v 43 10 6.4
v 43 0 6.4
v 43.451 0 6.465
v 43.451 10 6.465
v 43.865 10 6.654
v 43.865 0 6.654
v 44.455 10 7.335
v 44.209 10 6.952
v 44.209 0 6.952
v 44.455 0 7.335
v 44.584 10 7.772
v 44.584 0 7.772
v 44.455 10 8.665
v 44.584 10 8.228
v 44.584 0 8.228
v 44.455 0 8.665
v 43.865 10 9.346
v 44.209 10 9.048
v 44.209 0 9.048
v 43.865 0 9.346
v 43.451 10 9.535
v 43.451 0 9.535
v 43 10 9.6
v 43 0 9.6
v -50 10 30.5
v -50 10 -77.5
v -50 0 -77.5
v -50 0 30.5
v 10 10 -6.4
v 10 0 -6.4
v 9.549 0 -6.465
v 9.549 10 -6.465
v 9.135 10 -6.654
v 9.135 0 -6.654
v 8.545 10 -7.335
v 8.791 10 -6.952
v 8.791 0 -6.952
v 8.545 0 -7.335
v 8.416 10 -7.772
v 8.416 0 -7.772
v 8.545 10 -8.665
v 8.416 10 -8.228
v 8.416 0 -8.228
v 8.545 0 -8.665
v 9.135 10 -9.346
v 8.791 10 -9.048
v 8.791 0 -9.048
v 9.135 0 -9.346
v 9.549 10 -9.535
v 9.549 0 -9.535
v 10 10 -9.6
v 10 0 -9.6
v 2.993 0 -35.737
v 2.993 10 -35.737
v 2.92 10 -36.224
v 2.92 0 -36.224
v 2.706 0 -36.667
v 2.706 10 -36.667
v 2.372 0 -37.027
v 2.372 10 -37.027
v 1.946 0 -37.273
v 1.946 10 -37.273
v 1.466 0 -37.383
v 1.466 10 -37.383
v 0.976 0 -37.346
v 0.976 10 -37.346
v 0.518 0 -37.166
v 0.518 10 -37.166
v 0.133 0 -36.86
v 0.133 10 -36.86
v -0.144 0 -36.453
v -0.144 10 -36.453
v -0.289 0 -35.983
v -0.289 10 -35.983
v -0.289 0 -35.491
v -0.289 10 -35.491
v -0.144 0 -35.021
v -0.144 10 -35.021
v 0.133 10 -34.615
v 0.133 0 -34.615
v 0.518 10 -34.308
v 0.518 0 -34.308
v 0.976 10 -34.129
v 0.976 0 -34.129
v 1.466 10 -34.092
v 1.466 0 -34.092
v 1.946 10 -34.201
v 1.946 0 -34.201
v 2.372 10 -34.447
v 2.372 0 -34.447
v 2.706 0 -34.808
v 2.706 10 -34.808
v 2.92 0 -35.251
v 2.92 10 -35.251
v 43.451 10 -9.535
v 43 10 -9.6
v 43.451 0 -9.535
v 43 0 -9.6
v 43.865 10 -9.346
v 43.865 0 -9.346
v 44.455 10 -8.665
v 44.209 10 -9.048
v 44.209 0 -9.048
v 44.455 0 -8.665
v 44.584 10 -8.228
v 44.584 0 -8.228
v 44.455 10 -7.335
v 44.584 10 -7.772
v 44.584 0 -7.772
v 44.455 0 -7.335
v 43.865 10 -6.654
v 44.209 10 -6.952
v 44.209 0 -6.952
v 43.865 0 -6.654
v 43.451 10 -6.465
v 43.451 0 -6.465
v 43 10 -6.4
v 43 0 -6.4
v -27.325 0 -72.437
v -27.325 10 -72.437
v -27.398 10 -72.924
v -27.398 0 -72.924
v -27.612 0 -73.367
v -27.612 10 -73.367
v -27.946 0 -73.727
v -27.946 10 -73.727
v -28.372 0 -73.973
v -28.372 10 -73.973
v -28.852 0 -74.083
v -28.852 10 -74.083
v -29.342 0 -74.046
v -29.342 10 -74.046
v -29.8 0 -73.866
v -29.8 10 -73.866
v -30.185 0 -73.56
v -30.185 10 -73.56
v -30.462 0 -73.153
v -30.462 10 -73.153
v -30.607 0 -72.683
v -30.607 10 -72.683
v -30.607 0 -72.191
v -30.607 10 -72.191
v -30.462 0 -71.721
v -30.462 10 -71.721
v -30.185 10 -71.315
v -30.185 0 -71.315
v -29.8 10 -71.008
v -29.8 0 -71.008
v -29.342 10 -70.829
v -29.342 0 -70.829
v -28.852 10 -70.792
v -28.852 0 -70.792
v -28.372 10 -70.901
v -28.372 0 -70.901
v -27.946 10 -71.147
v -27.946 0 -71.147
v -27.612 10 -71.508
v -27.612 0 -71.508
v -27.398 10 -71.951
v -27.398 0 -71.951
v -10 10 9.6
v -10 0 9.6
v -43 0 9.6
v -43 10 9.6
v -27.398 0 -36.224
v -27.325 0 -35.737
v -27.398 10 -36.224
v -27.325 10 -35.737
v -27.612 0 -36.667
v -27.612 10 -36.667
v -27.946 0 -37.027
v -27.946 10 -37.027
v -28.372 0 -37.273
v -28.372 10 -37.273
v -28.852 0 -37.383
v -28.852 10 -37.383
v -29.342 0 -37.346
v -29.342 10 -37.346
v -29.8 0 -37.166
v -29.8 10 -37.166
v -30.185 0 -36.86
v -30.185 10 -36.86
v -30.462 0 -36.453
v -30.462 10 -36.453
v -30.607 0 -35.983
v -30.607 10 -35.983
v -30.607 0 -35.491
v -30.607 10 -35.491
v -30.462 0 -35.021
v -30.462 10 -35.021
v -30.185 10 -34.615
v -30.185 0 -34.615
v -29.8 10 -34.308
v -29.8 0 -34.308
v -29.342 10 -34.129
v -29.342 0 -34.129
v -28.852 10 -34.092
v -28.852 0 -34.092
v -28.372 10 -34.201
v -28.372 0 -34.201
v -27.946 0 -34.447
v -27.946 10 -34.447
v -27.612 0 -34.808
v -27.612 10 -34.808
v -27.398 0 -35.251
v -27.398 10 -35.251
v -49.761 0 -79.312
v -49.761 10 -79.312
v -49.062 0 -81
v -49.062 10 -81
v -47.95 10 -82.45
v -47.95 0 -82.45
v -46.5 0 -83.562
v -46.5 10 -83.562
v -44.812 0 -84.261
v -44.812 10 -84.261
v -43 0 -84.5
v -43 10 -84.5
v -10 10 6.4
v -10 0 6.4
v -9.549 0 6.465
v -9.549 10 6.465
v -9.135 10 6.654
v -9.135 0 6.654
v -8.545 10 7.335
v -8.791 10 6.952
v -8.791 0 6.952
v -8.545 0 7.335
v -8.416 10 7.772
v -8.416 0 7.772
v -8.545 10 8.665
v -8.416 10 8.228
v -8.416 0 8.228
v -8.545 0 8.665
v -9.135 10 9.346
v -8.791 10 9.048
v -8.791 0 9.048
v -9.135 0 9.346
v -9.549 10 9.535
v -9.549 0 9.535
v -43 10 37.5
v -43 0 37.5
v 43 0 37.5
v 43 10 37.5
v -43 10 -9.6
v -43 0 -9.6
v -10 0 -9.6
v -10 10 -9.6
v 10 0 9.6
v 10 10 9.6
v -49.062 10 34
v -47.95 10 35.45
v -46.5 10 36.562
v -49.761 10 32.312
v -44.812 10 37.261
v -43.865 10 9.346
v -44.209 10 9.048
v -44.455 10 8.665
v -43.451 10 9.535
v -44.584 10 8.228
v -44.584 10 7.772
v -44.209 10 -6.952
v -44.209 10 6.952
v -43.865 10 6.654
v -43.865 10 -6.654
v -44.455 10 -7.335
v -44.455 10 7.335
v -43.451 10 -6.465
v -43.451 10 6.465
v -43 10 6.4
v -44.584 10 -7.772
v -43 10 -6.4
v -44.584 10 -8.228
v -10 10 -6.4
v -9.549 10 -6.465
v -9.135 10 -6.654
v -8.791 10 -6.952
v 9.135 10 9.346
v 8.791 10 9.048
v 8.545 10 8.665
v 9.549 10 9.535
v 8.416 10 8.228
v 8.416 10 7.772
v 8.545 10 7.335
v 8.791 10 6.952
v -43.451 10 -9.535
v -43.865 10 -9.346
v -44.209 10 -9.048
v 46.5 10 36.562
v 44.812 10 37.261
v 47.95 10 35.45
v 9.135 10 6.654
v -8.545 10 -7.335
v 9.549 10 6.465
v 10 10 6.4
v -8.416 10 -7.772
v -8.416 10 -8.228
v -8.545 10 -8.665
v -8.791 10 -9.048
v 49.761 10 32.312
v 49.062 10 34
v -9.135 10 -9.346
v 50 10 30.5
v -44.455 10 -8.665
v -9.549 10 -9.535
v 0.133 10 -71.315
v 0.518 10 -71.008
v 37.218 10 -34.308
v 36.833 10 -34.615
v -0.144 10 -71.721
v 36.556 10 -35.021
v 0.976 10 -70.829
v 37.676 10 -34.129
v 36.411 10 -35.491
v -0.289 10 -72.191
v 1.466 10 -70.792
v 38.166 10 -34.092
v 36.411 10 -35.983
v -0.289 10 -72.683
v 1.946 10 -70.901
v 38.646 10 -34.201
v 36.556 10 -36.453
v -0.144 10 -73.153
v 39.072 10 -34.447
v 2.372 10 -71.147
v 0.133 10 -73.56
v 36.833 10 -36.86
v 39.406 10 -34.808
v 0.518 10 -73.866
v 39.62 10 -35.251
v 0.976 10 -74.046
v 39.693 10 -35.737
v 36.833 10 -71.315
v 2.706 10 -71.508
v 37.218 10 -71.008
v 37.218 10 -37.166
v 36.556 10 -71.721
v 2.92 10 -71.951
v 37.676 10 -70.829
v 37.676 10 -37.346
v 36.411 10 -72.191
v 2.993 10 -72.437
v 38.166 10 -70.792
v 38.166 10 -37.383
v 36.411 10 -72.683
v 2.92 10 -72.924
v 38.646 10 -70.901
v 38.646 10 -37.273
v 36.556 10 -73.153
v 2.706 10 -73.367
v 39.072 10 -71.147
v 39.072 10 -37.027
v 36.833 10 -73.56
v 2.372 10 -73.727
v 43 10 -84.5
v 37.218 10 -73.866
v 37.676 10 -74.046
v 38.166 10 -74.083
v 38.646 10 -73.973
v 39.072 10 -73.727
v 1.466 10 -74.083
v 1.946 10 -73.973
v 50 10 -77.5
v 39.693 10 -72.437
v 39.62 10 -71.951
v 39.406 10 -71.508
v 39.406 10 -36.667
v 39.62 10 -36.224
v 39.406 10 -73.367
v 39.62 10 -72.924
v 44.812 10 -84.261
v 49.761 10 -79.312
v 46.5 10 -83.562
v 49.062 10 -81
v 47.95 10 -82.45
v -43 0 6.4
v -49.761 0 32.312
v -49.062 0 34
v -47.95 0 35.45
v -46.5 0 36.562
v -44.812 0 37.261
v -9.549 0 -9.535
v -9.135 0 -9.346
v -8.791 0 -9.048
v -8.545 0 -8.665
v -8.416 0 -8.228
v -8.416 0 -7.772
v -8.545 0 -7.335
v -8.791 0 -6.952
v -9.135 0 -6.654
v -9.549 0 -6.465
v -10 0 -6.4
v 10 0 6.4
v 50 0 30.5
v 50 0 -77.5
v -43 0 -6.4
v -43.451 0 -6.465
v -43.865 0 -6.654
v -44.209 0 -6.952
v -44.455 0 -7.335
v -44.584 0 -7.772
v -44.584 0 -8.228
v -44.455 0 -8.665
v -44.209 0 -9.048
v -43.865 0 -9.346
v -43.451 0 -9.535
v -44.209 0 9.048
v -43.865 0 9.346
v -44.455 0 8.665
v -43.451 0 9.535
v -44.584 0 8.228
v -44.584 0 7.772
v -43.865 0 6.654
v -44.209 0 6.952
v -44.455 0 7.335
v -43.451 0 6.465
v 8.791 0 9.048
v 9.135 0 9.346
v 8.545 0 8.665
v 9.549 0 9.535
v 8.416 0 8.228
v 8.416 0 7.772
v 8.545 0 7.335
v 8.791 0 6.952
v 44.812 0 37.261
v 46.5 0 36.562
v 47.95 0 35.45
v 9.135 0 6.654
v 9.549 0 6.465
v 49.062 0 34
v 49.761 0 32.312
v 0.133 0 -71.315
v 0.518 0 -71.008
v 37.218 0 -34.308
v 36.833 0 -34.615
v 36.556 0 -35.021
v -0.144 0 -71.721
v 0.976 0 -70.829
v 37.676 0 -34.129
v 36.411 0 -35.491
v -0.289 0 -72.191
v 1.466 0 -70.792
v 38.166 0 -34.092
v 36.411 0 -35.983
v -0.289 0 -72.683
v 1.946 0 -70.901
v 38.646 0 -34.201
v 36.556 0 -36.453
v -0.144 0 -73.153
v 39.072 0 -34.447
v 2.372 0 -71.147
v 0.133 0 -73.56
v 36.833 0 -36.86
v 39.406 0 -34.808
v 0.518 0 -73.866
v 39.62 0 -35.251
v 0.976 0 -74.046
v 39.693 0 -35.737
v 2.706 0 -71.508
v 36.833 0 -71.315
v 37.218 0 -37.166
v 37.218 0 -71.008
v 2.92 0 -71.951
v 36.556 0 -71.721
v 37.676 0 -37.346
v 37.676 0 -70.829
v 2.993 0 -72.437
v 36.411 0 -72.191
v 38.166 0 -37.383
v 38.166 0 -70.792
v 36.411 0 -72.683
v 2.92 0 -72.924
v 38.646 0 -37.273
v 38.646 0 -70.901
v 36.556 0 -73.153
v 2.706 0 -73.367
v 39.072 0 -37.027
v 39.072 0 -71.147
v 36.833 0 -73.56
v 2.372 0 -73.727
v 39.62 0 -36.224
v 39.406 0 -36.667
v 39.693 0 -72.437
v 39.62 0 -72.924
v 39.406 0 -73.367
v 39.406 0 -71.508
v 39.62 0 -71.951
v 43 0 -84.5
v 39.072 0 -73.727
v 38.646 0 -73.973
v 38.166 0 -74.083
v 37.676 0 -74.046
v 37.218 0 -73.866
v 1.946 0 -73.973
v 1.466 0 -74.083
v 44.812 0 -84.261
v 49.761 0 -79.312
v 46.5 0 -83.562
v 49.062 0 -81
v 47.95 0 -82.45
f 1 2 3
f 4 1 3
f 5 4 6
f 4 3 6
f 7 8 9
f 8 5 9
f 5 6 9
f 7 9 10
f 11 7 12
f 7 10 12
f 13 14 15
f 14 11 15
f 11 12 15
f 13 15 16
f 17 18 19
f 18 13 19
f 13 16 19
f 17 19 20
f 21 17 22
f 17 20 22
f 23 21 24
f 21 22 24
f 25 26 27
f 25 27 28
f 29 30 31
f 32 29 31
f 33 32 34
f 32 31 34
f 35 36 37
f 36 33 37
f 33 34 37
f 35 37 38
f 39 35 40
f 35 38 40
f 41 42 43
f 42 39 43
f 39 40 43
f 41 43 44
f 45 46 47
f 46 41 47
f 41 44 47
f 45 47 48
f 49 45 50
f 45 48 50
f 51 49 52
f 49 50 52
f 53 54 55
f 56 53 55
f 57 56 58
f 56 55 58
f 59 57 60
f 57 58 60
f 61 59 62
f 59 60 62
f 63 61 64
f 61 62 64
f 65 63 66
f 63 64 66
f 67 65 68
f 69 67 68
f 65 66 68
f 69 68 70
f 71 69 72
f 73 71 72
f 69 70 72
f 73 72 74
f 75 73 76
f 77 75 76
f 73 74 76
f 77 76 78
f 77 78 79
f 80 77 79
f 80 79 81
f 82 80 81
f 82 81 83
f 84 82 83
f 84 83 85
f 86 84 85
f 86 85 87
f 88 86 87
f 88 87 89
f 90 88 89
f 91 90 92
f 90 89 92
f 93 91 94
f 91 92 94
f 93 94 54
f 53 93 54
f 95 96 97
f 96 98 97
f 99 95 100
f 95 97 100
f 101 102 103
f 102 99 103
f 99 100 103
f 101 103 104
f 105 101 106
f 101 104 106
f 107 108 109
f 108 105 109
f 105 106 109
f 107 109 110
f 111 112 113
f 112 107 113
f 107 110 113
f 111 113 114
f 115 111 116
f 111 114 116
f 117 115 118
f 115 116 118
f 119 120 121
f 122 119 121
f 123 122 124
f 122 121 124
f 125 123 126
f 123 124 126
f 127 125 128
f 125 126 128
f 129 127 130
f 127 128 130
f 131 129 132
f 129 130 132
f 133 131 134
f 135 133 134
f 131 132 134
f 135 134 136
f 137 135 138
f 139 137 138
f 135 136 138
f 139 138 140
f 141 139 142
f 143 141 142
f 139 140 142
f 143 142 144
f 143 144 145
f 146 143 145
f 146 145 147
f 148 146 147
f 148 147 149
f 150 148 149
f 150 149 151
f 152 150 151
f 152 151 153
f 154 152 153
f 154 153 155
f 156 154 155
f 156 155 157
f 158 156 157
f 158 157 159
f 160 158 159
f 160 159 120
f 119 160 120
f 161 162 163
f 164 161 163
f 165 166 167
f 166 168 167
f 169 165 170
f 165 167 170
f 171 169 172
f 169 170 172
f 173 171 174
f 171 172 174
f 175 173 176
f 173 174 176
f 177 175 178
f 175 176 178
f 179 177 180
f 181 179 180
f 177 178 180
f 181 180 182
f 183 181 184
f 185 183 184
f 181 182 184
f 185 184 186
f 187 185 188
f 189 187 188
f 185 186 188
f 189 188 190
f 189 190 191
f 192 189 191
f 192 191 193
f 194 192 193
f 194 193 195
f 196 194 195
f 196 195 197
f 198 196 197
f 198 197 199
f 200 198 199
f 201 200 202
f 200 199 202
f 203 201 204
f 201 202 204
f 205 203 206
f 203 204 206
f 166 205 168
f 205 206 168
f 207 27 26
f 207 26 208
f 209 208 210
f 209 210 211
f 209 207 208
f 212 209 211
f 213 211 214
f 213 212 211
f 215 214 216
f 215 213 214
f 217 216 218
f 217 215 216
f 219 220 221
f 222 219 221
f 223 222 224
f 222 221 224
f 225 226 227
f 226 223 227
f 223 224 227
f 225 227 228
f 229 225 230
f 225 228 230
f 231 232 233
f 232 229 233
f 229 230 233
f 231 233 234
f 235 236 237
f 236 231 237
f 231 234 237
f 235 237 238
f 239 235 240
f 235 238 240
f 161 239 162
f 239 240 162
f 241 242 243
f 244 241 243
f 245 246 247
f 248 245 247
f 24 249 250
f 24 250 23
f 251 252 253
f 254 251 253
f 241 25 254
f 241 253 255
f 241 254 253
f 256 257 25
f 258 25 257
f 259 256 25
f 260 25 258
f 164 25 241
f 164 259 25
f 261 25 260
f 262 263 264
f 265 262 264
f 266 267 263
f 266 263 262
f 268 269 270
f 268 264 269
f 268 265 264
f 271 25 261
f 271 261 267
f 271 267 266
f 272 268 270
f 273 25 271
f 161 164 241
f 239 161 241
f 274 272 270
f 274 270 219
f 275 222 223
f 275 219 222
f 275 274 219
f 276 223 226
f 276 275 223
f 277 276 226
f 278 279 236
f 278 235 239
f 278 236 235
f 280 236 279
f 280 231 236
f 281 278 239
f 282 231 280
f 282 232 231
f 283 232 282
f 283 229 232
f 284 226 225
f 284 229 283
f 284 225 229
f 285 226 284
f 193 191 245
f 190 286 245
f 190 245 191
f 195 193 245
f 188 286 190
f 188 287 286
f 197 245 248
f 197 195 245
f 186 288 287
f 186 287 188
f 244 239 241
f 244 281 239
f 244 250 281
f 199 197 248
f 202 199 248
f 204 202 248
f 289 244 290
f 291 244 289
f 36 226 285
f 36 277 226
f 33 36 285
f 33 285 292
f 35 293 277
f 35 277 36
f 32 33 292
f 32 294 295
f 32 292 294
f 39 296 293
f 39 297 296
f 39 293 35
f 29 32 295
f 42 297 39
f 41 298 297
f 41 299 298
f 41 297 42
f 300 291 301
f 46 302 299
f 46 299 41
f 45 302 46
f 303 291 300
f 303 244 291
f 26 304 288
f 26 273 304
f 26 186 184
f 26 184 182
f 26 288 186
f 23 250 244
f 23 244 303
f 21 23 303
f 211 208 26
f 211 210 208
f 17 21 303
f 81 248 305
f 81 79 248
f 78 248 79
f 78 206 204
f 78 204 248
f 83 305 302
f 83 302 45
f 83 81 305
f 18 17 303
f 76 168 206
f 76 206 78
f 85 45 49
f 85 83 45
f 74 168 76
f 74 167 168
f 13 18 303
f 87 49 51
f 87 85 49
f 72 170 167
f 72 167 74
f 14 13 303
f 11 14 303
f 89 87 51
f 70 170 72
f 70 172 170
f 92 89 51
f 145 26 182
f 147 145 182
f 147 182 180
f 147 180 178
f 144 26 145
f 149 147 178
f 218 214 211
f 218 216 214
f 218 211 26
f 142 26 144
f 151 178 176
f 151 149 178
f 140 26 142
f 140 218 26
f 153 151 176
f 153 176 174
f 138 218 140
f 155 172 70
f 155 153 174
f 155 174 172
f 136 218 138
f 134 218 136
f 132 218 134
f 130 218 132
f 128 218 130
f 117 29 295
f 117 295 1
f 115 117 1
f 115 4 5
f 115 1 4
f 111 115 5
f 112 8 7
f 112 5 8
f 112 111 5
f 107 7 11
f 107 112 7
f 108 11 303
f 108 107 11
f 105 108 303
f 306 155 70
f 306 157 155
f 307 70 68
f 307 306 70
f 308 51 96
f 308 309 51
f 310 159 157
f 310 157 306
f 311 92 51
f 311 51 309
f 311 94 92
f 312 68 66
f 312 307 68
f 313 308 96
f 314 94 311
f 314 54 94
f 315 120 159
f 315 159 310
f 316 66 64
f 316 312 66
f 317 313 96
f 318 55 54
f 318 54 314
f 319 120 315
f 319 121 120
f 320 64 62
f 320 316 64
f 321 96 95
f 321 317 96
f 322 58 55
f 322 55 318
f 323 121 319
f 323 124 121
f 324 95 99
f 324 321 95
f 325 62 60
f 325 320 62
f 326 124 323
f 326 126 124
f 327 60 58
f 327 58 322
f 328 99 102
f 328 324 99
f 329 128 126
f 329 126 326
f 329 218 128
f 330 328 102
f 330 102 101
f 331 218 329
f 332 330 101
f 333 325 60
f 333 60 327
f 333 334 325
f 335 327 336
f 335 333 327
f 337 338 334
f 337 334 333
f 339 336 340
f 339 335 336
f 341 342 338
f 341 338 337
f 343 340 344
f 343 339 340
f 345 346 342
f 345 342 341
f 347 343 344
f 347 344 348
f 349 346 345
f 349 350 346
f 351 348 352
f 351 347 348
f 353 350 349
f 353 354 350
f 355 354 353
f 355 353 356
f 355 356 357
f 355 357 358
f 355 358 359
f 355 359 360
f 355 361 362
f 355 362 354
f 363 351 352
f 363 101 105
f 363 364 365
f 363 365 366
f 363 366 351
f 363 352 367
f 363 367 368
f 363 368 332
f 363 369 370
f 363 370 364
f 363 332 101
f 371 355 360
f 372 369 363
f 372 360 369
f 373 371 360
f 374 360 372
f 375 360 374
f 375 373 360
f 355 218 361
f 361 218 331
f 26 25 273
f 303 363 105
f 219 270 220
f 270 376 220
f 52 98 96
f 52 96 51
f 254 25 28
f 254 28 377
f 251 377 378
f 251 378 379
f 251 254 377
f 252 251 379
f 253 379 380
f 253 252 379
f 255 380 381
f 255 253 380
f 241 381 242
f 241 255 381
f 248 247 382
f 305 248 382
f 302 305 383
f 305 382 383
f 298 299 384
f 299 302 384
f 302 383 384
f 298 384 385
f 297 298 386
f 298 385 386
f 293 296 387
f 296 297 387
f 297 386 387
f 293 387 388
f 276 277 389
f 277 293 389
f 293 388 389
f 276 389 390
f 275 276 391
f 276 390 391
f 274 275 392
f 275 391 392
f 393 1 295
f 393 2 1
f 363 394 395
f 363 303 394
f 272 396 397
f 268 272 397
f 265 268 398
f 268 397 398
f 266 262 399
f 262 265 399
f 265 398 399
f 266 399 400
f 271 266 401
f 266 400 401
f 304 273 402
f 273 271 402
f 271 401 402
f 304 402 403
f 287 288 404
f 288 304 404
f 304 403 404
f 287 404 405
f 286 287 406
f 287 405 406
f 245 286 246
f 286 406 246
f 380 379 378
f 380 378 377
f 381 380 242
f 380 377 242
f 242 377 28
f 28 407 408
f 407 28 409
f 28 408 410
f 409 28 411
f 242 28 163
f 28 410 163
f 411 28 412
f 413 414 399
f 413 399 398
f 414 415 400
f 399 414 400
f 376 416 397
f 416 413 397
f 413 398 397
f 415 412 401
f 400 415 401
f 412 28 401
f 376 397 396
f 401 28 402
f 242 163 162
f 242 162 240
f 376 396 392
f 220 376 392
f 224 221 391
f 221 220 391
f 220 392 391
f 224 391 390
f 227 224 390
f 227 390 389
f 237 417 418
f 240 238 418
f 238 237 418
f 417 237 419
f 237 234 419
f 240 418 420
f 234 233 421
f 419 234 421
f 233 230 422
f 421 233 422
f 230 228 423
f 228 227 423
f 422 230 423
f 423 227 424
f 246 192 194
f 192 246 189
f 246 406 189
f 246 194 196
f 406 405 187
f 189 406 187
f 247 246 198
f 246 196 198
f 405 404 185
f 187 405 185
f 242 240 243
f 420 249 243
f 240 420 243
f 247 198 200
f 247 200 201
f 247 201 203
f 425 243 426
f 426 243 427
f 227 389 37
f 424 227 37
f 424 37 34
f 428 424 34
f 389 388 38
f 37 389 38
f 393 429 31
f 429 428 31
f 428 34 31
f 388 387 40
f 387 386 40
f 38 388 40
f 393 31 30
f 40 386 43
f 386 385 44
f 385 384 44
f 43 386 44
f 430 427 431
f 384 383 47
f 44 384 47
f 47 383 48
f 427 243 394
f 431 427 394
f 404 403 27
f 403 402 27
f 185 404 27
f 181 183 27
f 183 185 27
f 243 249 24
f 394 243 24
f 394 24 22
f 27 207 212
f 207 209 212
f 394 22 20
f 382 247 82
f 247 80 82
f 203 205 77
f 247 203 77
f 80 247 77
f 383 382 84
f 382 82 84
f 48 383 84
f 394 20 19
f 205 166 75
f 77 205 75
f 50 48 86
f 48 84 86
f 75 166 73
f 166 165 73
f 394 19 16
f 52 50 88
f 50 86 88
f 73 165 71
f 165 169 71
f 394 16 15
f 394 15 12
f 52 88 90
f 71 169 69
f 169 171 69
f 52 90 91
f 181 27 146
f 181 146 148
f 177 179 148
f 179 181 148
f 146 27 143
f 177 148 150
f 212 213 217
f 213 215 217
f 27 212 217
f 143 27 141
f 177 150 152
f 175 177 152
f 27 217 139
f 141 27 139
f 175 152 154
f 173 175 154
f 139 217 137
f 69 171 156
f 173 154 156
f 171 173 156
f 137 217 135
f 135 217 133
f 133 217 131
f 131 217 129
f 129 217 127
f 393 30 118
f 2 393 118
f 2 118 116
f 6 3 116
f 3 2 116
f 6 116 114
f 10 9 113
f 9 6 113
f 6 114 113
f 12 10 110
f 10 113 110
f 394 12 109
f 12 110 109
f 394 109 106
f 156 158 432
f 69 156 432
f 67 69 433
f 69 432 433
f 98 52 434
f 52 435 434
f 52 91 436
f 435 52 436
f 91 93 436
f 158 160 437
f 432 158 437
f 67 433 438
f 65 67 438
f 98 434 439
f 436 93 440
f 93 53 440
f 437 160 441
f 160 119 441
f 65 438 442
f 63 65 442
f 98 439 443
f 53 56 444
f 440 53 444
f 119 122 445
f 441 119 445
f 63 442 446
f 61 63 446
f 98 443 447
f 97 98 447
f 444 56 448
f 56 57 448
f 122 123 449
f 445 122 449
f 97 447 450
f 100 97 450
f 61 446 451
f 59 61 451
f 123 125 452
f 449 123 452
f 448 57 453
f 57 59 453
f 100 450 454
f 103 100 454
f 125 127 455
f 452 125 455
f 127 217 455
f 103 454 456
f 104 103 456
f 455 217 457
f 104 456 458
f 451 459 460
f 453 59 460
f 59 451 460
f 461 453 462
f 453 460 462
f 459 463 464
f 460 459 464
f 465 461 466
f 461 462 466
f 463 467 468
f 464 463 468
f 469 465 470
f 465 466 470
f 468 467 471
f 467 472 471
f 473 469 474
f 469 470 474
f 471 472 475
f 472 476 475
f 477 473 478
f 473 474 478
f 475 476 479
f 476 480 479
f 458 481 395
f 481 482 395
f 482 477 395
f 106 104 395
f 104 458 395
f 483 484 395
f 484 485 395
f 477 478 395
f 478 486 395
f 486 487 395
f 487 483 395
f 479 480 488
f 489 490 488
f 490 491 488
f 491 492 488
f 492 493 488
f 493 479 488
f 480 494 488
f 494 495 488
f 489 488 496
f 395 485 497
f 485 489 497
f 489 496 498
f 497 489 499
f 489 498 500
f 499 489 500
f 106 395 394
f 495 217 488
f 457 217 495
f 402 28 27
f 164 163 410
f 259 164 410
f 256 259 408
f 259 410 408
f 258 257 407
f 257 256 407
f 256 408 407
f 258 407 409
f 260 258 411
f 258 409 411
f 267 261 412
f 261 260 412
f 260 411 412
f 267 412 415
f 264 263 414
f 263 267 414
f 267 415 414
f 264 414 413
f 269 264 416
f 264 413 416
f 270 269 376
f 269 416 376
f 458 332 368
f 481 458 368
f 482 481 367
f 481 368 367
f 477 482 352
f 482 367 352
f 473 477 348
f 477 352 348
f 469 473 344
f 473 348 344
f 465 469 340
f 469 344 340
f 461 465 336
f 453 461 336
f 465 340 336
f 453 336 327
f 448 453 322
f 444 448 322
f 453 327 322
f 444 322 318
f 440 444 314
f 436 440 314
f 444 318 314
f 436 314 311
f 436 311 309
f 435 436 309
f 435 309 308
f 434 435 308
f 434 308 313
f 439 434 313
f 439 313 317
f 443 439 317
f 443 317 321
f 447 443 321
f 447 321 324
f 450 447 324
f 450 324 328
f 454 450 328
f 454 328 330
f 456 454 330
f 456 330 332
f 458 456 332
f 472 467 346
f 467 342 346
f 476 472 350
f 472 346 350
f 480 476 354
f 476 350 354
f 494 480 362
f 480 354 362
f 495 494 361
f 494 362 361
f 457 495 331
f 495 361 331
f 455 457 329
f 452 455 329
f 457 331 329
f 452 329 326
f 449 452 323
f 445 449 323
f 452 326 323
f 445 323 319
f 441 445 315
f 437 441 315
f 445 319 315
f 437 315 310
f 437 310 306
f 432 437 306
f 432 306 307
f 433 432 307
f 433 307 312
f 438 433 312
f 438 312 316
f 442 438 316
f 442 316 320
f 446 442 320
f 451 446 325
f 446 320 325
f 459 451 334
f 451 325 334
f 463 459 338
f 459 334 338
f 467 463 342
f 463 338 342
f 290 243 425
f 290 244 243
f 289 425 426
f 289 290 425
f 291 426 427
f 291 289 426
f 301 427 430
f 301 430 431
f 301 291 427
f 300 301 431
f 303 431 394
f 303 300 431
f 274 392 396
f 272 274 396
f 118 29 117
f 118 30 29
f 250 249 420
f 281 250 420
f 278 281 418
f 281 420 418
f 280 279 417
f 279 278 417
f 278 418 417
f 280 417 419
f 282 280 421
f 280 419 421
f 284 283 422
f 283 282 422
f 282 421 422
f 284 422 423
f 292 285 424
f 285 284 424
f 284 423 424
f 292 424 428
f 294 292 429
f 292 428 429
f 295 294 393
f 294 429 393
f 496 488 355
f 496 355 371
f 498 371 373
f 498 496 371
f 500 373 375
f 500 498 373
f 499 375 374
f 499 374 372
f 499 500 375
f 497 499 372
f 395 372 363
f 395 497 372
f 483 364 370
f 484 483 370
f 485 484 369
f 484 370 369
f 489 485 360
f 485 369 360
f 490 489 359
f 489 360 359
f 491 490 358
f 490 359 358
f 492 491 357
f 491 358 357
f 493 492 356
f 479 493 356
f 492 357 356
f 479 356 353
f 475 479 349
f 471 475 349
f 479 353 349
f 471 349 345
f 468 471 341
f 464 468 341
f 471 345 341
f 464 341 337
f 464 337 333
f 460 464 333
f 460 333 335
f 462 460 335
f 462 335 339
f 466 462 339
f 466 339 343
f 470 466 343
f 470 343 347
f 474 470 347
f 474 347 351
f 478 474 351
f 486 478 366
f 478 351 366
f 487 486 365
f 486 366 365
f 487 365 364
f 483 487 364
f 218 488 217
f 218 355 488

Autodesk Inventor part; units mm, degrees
ref_plane "YZ Plane" through (0, 0, 0) normal (1, 0, 0) x (0, 1, 0)
ref_plane "XZ Plane" through (0, 0, 0) normal (0, 1, 0) x (-1, 0, 0)
ref_plane "XY Plane" through (0, 0, 0) normal (0, 0, 1) x (1, 0, 0)
sketch "Sketch1" plane through (0, 0, 0) normal (0, 1, 0) x (-1, 0, 0)
  line L0 (50, 37.5) -> (-50, 37.5)
  line L1 (-50, 37.5) -> (-50, -37.5)
  line L2 (-50, -37.5) -> (50, -37.5)
  line L3 (50, -37.5) -> (50, 37.5)
  line L4 (50, 37.5) -> (-50, -37.5) construction
  line L5 (-50, 37.5) -> (50, -37.5) construction
  line L6 (0, 0) -> (-10, 0)
  line L7 (-10, 0) -> (-10, 8)
  line L8 (-10, 0) -> (-2, 0) construction
  line L9 (-10, 0) -> (-10, -8)
  line L10 (-10, 0) -> (-2, 0) construction
  line L11 (-10, 8) -> (-43, 8) construction
  line L12 (-10, 9.6) -> (-43, 9.6)
  line L13 (-43, 6.4) -> (-10, 6.4)
  arc A0 (-10, 6.4) -> (-10, 9.6) centre (-10, 8) ccw
  arc A1 (-43, 9.6) -> (-43, 6.4) centre (-43, 8) ccw
  line L14 (-10, 8) -> (23, 8) construction
  line L15 (0, 0) -> (-50, 0)
  line L16 (-10, -8) -> (-43, -8) construction
  line L17 (-10, -6.4) -> (-43, -6.4)
  line L18 (-43, -9.6) -> (-10, -9.6)
  arc A2 (-10, -9.6) -> (-10, -6.4) centre (-10, -8) ccw
  arc A3 (-43, -6.4) -> (-43, -9.6) centre (-43, -8) ccw
  line L19 (-10, -8) -> (23, -8) construction
  line L20 (0, 37.5) -> (0, -37.5)
  line L21 (10, 0) -> (10, 8)
  line L22 (10, 0) -> (10, -8)
  line L23 (10, 8) -> (43, 8) construction
  line L24 (10, 9.6) -> (43, 9.6)
  line L25 (43, 6.4) -> (10, 6.4)
  arc A4 (10, 9.6) -> (10, 6.4) centre (10, 8) ccw
  arc A5 (43, 6.4) -> (43, 9.6) centre (43, 8) ccw
  line L26 (10, -8) -> (43, -8) construction
  line L27 (10, -6.4) -> (43, -6.4)
  line L28 (43, -9.6) -> (10, -9.6)
  arc A6 (10, -6.4) -> (10, -9.6) centre (10, -8) ccw
  arc A7 (43, -9.6) -> (43, -6.4) centre (43, -8) ccw
  point P0 (-26.5, 8)
  point P1 (-26.5, -8)
  point P2 (26.5, 8)
  point P3 (26.5, -8)
  dimension "d0" = 100
  dimension "d1" = 75
  dimension "d2" = 10
  dimension "d3" = 8
  dimension "d4" = 90
  dimension "d5" = 8
  dimension "d6" = 90
  dimension "d7" = 33
  dimension "d8" = 180
  dimension "d9" = 3.2
  dimension "d10" = 33
  dimension "d11" = 180
  dimension "d12" = 3.2
extrude "Extrusion1" add sketch "Sketch1" along normal blind 10
sketch "Sketch2" plane through (0, 10, 0) normal (0, 1, 0) x (1, 0, 0)
  line L0 (50, 37.5) -> (-50, 37.5) projected
  line L1 (-50, 37.5) -> (50, 37.5)
  line L2 (50, 37.5) -> (50, 84.5)
  line L3 (50, 84.5) -> (-50, 84.5)
  line L4 (-50, 84.5) -> (-50, 37.5)
  point P0 (0, 0)
  dimension "d15" = 47
extrude "Extrusion2" add sketch "Sketch2" against normal blind 10
sketch "Sketch3" plane through (0, 10, 0) normal (0, 1, 0) x (1, 0, 0)
  line L0 (38.0429, 35.7373) -> (1.3429, 35.7373)
  line L1 (1.3429, 35.7373) -> (1.3429, 72.4373)
  line L2 (1.3429, 72.4373) -> (38.0429, 72.4373)
  line L3 (38.0429, 72.4373) -> (38.0429, 35.7373)
  circle A0 centre (1.3429, 72.4373) radius 1.65
  circle A1 centre (1.3429, 35.7373) radius 1.65
  circle A2 centre (38.0429, 35.7373) radius 1.65
  circle A3 centre (38.0429, 72.4373) radius 1.65
  line L4 (-28.9751, 35.7373) -> (-28.9751, 72.4373)
  circle A4 centre (-28.9751, 72.4373) radius 1.65
  circle A5 centre (-28.9751, 35.7373) radius 1.65
  point P0 (0, 0)
  dimension "d18" = 36.7
  dimension "d19" = 36.7
  dimension "d20" = 3.3
  dimension "d21" = 3.3
  dimension "d22" = 3.3
  dimension "d23" = 3.3
  dimension "d24" = 36.7
  dimension "d25" = 3.3
  dimension "d26" = 3.3
extrude "Extrusion3" cut sketch "Sketch3" against normal blind 10 contours A1 L1 L0 | L0 L1 A1 | A2 L3 L0 | L0 L3 A2 | A0 L2 L1 | L1 L2 A0 | A3 L2 L3 | L3 L2 A3 | A4 | A5
sketch "Sketch4" plane through (0, 10, 0) normal (0, 1, 0) x (1, 0, 0)
  point P0 (0, 0)
fillet "Fillet1" radius 7 4 edges at (-50, 5, 37.5) (50, 5, 37.5) (50, 5, -84.5) (-50, 5, -84.5)
properties part number "bas" material "Polycarbonate, Clear"
